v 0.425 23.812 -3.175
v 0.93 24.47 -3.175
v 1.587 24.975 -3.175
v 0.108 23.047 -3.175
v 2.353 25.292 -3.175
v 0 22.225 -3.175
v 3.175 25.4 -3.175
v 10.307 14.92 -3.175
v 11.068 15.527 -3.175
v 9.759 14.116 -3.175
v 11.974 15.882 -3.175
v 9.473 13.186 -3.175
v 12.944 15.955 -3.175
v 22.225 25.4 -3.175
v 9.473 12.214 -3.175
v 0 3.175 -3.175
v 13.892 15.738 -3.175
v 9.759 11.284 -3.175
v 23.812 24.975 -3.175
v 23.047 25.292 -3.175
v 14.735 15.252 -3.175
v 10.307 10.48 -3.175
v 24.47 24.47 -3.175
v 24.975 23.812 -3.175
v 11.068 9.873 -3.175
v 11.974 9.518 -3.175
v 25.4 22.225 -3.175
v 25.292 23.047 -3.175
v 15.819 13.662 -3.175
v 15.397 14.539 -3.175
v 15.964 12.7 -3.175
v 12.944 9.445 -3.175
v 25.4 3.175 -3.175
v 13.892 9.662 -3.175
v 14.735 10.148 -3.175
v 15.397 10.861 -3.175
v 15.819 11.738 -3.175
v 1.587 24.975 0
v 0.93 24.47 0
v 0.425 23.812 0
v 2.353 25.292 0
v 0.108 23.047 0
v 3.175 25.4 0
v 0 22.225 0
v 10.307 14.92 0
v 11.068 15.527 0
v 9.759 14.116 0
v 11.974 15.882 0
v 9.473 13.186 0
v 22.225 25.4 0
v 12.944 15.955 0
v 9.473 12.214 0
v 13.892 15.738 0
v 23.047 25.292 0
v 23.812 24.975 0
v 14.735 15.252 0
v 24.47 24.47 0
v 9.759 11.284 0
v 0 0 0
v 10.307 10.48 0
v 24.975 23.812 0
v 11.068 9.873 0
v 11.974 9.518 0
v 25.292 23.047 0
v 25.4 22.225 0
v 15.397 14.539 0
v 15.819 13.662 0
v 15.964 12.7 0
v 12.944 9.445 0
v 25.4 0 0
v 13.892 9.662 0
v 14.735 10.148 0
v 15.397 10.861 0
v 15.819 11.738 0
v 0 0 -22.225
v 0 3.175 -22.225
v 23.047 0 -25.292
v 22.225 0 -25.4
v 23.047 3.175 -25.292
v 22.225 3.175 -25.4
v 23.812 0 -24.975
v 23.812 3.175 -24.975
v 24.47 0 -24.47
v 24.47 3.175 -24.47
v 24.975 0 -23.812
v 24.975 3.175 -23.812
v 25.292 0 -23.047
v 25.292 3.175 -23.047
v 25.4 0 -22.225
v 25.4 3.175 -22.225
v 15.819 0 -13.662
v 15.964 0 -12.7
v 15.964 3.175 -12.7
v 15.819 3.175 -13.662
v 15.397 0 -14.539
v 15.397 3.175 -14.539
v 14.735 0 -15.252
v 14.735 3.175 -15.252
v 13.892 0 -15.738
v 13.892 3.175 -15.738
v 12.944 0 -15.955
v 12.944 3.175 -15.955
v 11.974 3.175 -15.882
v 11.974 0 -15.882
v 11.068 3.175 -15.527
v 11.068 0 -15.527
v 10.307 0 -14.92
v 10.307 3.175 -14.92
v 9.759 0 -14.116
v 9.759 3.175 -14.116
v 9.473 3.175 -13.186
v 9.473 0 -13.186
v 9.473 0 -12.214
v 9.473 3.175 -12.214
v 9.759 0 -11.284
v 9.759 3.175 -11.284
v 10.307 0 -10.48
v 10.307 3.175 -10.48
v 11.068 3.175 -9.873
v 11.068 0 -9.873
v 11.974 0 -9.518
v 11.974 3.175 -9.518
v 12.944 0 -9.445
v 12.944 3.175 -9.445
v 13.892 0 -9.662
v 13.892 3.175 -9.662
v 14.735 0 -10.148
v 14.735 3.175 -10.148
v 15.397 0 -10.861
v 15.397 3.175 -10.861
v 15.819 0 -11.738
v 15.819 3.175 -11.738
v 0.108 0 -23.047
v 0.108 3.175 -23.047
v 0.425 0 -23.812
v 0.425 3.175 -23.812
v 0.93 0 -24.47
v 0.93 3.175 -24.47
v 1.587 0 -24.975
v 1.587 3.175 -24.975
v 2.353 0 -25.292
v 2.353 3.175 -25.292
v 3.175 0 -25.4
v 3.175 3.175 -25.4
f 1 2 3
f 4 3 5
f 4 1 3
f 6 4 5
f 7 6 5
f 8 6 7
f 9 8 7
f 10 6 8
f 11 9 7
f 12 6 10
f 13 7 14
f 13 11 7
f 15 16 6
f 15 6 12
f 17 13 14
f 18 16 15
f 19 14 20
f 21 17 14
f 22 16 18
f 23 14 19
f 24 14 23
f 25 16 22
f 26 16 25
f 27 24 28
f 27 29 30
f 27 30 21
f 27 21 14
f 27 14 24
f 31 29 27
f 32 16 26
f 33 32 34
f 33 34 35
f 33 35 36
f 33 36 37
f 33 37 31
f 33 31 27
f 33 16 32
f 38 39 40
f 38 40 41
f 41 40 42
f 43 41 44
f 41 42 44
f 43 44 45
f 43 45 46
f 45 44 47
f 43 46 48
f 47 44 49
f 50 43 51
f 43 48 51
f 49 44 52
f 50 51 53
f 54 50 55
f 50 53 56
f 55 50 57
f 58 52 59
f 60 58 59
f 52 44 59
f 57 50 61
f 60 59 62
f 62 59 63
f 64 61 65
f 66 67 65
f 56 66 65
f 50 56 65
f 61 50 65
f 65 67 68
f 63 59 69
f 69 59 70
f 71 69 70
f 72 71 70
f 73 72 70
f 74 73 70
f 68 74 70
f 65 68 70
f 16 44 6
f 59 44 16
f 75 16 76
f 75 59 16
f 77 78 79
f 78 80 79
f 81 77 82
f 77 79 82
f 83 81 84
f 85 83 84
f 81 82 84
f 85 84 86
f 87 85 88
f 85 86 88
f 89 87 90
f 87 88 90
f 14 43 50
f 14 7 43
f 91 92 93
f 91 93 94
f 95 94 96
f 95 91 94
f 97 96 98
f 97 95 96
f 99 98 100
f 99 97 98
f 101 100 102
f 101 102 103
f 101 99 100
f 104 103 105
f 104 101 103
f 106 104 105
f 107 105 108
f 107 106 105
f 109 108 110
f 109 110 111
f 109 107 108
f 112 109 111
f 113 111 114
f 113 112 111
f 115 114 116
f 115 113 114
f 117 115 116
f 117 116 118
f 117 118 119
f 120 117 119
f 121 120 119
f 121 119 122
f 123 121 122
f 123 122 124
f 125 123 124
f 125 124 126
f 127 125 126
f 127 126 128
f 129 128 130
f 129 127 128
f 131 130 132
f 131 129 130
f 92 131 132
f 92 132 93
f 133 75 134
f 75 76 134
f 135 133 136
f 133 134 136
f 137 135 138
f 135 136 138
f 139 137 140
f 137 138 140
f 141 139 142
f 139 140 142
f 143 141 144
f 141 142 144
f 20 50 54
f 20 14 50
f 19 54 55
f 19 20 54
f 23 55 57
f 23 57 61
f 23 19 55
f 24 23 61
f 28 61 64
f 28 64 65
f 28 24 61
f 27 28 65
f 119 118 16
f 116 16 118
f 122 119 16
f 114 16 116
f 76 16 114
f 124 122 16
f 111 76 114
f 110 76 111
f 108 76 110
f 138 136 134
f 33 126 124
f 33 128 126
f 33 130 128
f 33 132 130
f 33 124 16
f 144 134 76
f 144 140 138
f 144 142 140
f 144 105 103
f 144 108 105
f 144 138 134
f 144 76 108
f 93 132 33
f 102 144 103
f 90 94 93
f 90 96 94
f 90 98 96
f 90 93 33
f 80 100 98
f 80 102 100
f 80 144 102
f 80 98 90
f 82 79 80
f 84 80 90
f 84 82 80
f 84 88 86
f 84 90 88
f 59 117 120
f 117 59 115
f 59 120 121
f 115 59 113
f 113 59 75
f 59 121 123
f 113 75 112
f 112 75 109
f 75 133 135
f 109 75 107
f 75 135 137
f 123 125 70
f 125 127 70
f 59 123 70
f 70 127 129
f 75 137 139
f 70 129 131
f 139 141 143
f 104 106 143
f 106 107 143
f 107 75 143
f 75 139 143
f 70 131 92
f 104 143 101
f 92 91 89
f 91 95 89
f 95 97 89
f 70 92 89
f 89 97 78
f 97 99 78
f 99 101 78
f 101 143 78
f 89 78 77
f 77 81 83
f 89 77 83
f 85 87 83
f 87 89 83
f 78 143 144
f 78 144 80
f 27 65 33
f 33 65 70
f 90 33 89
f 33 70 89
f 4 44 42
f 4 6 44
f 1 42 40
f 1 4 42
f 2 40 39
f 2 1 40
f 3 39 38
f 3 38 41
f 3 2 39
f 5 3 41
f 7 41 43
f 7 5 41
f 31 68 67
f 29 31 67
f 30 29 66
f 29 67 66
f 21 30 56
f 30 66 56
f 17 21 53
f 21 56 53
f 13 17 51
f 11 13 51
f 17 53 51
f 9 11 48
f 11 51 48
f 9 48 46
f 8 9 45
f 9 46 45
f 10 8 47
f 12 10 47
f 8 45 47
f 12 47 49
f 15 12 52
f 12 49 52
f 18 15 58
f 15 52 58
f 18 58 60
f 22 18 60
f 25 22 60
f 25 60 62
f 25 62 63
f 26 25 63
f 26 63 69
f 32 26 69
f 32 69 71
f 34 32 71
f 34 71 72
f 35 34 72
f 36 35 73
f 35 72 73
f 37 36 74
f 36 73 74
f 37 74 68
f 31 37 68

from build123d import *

# Parameters (mm, degrees)
SKETCH1_W           = 25.4
SKETCH1_H           = 25.4
SKETCH1_R           = 3.2639
BOSS_EXTRUDE1_DEPTH = 3.175
SKETCH2_W           = 25.4
SKETCH2_H           = 3.175
BOSS_EXTRUDE2_DEPTH = 22.225
SKETCH3_R           = 3.2639
CUT_EXTRUDE1_DEPTH  = 3.175
FILLET1_R           = 3.175


with BuildPart() as part:
    # Sketch1 → Boss-Extrude1 (new body)
    with BuildSketch(Plane(origin=(0, 0, 0), x_dir=(1, 0, 0), z_dir=(0, 1, 0))):
        with Locations((12.7, 12.7)):
            Rectangle(SKETCH1_W, SKETCH1_H)
        with Locations((12.7, 12.7)):
            Circle(SKETCH1_R, mode=Mode.SUBTRACT)
    extrude(amount=BOSS_EXTRUDE1_DEPTH)

    # Sketch2 → Boss-Extrude2 (add)
    with BuildSketch(Plane(origin=(0, 3.175, 0), x_dir=(1, 0, 0), z_dir=(0, 1, 0))):
        with Locations((12.7, 1.5875)):
            Rectangle(SKETCH2_W, SKETCH2_H)
    extrude(amount=BOSS_EXTRUDE2_DEPTH)

    # Sketch3 → Cut-Extrude1 (cut)
    with BuildSketch(Plane.XY):
        with Locations((12.7, 12.7)):
            Circle(SKETCH3_R)
    extrude(amount=-CUT_EXTRUDE1_DEPTH, mode=Mode.SUBTRACT)

    # Fillet1
    fillet1_edges = [part.edges().sort_by_distance(p)[0] for p in [
        (0, 25.4, -1.5875),
        (25.4, 25.4, -1.5875),
        (0, 1.5875, -25.4),
        (25.4, 1.5875, -25.4),
    ]]
    fillet(fillet1_edges, radius=FILLET1_R)


solid = part.part
